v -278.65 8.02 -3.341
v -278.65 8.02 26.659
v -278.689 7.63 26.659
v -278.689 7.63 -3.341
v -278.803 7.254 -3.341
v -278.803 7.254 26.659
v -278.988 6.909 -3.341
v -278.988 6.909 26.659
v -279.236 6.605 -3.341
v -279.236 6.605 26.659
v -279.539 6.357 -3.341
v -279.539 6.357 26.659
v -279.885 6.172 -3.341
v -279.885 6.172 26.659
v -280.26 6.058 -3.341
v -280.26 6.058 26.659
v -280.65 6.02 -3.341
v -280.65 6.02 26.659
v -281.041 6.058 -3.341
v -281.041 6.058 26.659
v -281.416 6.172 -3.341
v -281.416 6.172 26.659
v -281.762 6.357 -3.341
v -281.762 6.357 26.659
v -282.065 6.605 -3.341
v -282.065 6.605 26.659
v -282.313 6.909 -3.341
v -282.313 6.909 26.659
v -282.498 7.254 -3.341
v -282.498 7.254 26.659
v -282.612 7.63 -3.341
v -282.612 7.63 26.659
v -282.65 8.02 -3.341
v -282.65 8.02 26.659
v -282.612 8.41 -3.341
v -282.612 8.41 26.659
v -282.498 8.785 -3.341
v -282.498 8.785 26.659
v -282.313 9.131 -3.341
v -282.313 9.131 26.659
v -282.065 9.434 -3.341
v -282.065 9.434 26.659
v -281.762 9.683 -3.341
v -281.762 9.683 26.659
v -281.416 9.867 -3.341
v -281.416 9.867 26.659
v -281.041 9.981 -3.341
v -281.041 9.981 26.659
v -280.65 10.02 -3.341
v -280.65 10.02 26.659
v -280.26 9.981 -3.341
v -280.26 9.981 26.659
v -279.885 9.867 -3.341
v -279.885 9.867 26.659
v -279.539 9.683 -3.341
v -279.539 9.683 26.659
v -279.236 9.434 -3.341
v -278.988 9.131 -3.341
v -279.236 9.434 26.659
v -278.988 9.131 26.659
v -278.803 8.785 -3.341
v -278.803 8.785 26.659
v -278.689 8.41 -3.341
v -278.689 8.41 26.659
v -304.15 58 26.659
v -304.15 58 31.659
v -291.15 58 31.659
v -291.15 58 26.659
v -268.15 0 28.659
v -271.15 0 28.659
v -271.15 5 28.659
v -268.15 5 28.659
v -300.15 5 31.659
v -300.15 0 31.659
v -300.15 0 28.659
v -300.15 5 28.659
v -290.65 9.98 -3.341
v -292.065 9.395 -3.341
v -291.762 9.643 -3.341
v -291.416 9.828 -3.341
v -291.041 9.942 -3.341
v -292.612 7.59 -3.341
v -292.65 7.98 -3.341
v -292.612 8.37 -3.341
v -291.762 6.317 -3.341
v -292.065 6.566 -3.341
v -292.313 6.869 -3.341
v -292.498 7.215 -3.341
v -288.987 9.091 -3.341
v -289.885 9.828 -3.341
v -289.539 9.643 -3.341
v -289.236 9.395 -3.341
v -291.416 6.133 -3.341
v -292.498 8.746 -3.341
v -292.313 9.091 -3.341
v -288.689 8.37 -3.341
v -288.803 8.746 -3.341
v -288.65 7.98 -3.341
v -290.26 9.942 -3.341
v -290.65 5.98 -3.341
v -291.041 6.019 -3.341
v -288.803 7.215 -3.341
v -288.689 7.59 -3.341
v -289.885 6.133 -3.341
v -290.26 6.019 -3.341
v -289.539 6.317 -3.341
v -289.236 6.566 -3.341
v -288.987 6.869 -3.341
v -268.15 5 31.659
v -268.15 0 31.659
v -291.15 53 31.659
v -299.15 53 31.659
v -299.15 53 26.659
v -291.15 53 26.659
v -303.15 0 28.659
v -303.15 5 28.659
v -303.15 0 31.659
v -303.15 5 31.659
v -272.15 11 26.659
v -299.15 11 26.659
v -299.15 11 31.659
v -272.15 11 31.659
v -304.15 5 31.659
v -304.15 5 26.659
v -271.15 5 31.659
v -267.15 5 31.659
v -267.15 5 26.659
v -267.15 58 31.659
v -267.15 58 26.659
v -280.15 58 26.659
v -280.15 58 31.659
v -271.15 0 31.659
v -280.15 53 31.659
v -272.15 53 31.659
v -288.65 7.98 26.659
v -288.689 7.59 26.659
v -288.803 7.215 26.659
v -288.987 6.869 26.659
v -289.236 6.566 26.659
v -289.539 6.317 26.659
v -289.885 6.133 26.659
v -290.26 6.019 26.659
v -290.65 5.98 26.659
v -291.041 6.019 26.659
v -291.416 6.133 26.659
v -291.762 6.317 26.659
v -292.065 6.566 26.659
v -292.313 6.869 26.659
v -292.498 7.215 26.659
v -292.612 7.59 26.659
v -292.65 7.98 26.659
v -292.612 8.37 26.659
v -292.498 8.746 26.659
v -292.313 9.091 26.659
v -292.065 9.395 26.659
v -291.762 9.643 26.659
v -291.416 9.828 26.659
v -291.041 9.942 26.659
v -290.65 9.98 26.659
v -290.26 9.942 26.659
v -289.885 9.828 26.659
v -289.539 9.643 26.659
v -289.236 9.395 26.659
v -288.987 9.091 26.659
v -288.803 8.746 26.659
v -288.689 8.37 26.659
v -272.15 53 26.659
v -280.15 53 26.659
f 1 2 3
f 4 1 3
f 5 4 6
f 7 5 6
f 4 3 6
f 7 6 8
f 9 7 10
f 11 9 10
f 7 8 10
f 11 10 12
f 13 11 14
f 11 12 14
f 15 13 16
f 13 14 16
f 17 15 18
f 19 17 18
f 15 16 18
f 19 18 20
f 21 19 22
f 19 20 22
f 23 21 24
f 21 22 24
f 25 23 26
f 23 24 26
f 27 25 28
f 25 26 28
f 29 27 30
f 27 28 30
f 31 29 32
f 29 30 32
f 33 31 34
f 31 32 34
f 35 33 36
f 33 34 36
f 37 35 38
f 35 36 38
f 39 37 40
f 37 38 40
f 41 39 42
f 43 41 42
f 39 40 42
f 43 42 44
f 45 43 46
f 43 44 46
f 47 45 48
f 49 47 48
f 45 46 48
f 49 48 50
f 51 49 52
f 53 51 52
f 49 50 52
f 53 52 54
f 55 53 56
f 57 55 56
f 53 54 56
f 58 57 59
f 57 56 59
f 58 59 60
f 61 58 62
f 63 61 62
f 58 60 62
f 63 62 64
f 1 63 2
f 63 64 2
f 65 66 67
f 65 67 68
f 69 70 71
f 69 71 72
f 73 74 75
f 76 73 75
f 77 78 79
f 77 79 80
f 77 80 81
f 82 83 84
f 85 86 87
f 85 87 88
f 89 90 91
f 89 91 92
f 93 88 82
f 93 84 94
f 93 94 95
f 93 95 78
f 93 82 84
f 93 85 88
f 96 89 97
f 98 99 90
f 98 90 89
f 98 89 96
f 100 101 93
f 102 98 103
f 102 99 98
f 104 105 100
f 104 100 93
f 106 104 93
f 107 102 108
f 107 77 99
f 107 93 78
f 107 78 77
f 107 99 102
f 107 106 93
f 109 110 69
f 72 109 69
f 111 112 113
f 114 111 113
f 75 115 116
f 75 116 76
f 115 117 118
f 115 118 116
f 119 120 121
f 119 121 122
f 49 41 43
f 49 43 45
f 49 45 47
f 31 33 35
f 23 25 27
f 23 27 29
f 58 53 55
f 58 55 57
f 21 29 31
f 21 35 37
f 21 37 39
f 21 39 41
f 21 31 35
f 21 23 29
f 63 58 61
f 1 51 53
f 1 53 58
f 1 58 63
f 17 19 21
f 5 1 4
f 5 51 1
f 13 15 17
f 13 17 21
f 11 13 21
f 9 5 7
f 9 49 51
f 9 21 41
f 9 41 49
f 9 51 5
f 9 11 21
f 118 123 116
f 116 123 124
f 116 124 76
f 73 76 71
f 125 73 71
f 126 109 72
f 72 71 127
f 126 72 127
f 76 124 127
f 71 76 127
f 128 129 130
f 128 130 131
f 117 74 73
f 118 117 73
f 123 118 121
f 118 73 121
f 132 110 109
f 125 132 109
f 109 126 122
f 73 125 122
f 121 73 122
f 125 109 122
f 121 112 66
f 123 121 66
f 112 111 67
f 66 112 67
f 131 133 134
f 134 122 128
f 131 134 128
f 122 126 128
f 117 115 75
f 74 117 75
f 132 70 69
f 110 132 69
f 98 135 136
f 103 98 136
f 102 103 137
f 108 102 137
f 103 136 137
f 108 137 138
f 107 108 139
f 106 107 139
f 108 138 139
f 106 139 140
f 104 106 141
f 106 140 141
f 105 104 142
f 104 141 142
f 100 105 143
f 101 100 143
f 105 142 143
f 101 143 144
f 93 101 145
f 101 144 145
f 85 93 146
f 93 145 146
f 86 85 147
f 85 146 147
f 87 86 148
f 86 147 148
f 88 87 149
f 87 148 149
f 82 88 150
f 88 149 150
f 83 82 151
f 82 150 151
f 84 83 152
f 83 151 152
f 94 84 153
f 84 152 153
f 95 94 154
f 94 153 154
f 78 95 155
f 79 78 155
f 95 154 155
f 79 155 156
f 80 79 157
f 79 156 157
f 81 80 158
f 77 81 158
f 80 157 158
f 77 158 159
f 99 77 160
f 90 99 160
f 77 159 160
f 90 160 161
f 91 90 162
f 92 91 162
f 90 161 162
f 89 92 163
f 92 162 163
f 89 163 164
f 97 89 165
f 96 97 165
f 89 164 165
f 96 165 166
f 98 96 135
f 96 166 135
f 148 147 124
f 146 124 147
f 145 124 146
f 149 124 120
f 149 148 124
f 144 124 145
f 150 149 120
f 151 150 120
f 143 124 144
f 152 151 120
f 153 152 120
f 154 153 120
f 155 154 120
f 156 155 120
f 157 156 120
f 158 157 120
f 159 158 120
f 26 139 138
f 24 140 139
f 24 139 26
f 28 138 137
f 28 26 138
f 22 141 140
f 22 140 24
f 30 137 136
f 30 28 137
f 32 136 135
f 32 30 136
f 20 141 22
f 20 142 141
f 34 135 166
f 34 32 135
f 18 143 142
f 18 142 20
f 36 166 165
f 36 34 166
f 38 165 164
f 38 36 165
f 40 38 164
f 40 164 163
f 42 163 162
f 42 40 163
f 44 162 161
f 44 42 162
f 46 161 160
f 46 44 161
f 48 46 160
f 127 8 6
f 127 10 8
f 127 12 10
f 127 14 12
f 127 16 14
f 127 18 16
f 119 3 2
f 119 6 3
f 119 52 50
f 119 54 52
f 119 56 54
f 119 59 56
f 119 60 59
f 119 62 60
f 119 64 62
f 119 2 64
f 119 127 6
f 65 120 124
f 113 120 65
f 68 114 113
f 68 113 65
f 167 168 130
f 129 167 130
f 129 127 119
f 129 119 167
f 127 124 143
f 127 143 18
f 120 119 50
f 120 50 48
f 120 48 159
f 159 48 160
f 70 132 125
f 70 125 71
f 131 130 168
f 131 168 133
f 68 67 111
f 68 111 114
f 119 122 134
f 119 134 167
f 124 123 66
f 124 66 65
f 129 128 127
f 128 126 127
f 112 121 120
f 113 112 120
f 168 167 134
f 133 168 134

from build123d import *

# Parameters (mm, degrees)
SKETCH_1_W        = 3
SKETCH_1_H        = 3
EXTRUDE_1_DEPTH   = 5
EXTRUDE_1_2_DEPTH = 5
SKETCH_2_W        = 5
SKETCH_2_H        = 5
EXTRUDE_2_DEPTH   = 6
SKETCH_4_W        = 37
SKETCH_4_H        = 5
EXTRUDE_3_DEPTH   = 6
SKETCH_5_R        = 2
EXTRUDE_4_DEPTH   = 30
SKETCH_6_W        = 5
SKETCH_6_H        = 5
EXTRUDE_5_DEPTH   = 47
SKETCH_7_W        = 5
SKETCH_7_H        = 5
EXTRUDE_6_DEPTH   = 8
SKETCH_8_W        = 5
SKETCH_8_H        = 5
EXTRUDE_7_DEPTH   = 8


with BuildPart() as part:
    # 草图1 → 凸台-拉伸1 (new body)
    with BuildSketch(Plane(origin=(0, 0, 0), x_dir=(1, 0, 0), z_dir=(0, 1, 0))):
        with Locations((-301.650432081, -30.158642095)):
            Rectangle(SKETCH_1_W, SKETCH_1_H)
    extrude(amount=EXTRUDE_1_DEPTH)



with BuildPart() as body_2:
    # 草图1 → Extrude 1 2 (new body)
    with BuildSketch(Plane(origin=(0, 0, 0), x_dir=(1, 0, 0), z_dir=(0, 1, 0))):
        with Locations((-269.650432081, -30.158642095)):
            Rectangle(SKETCH_1_W, SKETCH_1_H)
    extrude(amount=EXTRUDE_1_2_DEPTH)


with BuildPart() as part_1:
    add(part.part)

    add(body_2.part)  # 凸台-拉伸2 merges body 2
    # 草图2 → 凸台-拉伸2 (add)
    with BuildSketch(Plane(origin=(0, 5, 0), x_dir=(1, 0, 0), z_dir=(0, 1, 0))):
        with Locations((-301.650432081, -29.158642095)):
            Rectangle(SKETCH_2_W, SKETCH_2_H)
        with Locations((-269.650432081, -29.158642095)):
            Rectangle(SKETCH_2_W, SKETCH_2_H)
    extrude(amount=EXTRUDE_2_DEPTH)

    # 草图4 → 凸台-拉伸3 (add)
    with BuildSketch(Plane(origin=(0, 11, 0), x_dir=(1, 0, 0), z_dir=(0, 1, 0))):
        with Locations((-285.650432081, -29.158642095)):
            Rectangle(SKETCH_4_W, SKETCH_4_H)
    extrude(amount=-EXTRUDE_3_DEPTH)

    # 草图5 → 凸台-拉伸4 (add)
    with BuildSketch(Plane(origin=(0, 0, 26.658642095), x_dir=(-1, 0, 0), z_dir=(0, 0, -1))):
        with Locations(Location((280.65047083, 8.019684887, 0), (0, 0, 180))):
            Circle(SKETCH_5_R)
        with Locations(Location((290.650393331, 7.980315113, 0), (0, 0, 180))):
            Circle(SKETCH_5_R)
    extrude(amount=EXTRUDE_4_DEPTH)

    # 草图6 → 凸台-拉伸5 (add)
    with BuildSketch(Plane(origin=(0, 11, 0), x_dir=(1, 0, 0), z_dir=(0, 1, 0))):
        with Locations((-269.650432081, -29.158642095)):
            Rectangle(SKETCH_6_W, SKETCH_6_H)
        with Locations((-301.650432081, -29.158642095)):
            Rectangle(SKETCH_6_W, SKETCH_6_H)
    extrude(amount=EXTRUDE_5_DEPTH)

    # 草图7 → 凸台-拉伸6 (add)
    with BuildSketch(Plane(origin=(-299.150432081, 0, 0), x_dir=(0, 0, -1), z_dir=(1, 0, 0))):
        with Locations((-29.158642095, 55.5)):
            Rectangle(SKETCH_7_W, SKETCH_7_H)
    extrude(amount=EXTRUDE_6_DEPTH)

    # 草图8 → 凸台-拉伸7 (add)
    with BuildSketch(Plane.ZY.offset(272.150432081)):
        with Locations((29.158642095, 55.5)):
            Rectangle(SKETCH_8_W, SKETCH_8_H)
    extrude(amount=EXTRUDE_7_DEPTH)


solid = part_1.part
